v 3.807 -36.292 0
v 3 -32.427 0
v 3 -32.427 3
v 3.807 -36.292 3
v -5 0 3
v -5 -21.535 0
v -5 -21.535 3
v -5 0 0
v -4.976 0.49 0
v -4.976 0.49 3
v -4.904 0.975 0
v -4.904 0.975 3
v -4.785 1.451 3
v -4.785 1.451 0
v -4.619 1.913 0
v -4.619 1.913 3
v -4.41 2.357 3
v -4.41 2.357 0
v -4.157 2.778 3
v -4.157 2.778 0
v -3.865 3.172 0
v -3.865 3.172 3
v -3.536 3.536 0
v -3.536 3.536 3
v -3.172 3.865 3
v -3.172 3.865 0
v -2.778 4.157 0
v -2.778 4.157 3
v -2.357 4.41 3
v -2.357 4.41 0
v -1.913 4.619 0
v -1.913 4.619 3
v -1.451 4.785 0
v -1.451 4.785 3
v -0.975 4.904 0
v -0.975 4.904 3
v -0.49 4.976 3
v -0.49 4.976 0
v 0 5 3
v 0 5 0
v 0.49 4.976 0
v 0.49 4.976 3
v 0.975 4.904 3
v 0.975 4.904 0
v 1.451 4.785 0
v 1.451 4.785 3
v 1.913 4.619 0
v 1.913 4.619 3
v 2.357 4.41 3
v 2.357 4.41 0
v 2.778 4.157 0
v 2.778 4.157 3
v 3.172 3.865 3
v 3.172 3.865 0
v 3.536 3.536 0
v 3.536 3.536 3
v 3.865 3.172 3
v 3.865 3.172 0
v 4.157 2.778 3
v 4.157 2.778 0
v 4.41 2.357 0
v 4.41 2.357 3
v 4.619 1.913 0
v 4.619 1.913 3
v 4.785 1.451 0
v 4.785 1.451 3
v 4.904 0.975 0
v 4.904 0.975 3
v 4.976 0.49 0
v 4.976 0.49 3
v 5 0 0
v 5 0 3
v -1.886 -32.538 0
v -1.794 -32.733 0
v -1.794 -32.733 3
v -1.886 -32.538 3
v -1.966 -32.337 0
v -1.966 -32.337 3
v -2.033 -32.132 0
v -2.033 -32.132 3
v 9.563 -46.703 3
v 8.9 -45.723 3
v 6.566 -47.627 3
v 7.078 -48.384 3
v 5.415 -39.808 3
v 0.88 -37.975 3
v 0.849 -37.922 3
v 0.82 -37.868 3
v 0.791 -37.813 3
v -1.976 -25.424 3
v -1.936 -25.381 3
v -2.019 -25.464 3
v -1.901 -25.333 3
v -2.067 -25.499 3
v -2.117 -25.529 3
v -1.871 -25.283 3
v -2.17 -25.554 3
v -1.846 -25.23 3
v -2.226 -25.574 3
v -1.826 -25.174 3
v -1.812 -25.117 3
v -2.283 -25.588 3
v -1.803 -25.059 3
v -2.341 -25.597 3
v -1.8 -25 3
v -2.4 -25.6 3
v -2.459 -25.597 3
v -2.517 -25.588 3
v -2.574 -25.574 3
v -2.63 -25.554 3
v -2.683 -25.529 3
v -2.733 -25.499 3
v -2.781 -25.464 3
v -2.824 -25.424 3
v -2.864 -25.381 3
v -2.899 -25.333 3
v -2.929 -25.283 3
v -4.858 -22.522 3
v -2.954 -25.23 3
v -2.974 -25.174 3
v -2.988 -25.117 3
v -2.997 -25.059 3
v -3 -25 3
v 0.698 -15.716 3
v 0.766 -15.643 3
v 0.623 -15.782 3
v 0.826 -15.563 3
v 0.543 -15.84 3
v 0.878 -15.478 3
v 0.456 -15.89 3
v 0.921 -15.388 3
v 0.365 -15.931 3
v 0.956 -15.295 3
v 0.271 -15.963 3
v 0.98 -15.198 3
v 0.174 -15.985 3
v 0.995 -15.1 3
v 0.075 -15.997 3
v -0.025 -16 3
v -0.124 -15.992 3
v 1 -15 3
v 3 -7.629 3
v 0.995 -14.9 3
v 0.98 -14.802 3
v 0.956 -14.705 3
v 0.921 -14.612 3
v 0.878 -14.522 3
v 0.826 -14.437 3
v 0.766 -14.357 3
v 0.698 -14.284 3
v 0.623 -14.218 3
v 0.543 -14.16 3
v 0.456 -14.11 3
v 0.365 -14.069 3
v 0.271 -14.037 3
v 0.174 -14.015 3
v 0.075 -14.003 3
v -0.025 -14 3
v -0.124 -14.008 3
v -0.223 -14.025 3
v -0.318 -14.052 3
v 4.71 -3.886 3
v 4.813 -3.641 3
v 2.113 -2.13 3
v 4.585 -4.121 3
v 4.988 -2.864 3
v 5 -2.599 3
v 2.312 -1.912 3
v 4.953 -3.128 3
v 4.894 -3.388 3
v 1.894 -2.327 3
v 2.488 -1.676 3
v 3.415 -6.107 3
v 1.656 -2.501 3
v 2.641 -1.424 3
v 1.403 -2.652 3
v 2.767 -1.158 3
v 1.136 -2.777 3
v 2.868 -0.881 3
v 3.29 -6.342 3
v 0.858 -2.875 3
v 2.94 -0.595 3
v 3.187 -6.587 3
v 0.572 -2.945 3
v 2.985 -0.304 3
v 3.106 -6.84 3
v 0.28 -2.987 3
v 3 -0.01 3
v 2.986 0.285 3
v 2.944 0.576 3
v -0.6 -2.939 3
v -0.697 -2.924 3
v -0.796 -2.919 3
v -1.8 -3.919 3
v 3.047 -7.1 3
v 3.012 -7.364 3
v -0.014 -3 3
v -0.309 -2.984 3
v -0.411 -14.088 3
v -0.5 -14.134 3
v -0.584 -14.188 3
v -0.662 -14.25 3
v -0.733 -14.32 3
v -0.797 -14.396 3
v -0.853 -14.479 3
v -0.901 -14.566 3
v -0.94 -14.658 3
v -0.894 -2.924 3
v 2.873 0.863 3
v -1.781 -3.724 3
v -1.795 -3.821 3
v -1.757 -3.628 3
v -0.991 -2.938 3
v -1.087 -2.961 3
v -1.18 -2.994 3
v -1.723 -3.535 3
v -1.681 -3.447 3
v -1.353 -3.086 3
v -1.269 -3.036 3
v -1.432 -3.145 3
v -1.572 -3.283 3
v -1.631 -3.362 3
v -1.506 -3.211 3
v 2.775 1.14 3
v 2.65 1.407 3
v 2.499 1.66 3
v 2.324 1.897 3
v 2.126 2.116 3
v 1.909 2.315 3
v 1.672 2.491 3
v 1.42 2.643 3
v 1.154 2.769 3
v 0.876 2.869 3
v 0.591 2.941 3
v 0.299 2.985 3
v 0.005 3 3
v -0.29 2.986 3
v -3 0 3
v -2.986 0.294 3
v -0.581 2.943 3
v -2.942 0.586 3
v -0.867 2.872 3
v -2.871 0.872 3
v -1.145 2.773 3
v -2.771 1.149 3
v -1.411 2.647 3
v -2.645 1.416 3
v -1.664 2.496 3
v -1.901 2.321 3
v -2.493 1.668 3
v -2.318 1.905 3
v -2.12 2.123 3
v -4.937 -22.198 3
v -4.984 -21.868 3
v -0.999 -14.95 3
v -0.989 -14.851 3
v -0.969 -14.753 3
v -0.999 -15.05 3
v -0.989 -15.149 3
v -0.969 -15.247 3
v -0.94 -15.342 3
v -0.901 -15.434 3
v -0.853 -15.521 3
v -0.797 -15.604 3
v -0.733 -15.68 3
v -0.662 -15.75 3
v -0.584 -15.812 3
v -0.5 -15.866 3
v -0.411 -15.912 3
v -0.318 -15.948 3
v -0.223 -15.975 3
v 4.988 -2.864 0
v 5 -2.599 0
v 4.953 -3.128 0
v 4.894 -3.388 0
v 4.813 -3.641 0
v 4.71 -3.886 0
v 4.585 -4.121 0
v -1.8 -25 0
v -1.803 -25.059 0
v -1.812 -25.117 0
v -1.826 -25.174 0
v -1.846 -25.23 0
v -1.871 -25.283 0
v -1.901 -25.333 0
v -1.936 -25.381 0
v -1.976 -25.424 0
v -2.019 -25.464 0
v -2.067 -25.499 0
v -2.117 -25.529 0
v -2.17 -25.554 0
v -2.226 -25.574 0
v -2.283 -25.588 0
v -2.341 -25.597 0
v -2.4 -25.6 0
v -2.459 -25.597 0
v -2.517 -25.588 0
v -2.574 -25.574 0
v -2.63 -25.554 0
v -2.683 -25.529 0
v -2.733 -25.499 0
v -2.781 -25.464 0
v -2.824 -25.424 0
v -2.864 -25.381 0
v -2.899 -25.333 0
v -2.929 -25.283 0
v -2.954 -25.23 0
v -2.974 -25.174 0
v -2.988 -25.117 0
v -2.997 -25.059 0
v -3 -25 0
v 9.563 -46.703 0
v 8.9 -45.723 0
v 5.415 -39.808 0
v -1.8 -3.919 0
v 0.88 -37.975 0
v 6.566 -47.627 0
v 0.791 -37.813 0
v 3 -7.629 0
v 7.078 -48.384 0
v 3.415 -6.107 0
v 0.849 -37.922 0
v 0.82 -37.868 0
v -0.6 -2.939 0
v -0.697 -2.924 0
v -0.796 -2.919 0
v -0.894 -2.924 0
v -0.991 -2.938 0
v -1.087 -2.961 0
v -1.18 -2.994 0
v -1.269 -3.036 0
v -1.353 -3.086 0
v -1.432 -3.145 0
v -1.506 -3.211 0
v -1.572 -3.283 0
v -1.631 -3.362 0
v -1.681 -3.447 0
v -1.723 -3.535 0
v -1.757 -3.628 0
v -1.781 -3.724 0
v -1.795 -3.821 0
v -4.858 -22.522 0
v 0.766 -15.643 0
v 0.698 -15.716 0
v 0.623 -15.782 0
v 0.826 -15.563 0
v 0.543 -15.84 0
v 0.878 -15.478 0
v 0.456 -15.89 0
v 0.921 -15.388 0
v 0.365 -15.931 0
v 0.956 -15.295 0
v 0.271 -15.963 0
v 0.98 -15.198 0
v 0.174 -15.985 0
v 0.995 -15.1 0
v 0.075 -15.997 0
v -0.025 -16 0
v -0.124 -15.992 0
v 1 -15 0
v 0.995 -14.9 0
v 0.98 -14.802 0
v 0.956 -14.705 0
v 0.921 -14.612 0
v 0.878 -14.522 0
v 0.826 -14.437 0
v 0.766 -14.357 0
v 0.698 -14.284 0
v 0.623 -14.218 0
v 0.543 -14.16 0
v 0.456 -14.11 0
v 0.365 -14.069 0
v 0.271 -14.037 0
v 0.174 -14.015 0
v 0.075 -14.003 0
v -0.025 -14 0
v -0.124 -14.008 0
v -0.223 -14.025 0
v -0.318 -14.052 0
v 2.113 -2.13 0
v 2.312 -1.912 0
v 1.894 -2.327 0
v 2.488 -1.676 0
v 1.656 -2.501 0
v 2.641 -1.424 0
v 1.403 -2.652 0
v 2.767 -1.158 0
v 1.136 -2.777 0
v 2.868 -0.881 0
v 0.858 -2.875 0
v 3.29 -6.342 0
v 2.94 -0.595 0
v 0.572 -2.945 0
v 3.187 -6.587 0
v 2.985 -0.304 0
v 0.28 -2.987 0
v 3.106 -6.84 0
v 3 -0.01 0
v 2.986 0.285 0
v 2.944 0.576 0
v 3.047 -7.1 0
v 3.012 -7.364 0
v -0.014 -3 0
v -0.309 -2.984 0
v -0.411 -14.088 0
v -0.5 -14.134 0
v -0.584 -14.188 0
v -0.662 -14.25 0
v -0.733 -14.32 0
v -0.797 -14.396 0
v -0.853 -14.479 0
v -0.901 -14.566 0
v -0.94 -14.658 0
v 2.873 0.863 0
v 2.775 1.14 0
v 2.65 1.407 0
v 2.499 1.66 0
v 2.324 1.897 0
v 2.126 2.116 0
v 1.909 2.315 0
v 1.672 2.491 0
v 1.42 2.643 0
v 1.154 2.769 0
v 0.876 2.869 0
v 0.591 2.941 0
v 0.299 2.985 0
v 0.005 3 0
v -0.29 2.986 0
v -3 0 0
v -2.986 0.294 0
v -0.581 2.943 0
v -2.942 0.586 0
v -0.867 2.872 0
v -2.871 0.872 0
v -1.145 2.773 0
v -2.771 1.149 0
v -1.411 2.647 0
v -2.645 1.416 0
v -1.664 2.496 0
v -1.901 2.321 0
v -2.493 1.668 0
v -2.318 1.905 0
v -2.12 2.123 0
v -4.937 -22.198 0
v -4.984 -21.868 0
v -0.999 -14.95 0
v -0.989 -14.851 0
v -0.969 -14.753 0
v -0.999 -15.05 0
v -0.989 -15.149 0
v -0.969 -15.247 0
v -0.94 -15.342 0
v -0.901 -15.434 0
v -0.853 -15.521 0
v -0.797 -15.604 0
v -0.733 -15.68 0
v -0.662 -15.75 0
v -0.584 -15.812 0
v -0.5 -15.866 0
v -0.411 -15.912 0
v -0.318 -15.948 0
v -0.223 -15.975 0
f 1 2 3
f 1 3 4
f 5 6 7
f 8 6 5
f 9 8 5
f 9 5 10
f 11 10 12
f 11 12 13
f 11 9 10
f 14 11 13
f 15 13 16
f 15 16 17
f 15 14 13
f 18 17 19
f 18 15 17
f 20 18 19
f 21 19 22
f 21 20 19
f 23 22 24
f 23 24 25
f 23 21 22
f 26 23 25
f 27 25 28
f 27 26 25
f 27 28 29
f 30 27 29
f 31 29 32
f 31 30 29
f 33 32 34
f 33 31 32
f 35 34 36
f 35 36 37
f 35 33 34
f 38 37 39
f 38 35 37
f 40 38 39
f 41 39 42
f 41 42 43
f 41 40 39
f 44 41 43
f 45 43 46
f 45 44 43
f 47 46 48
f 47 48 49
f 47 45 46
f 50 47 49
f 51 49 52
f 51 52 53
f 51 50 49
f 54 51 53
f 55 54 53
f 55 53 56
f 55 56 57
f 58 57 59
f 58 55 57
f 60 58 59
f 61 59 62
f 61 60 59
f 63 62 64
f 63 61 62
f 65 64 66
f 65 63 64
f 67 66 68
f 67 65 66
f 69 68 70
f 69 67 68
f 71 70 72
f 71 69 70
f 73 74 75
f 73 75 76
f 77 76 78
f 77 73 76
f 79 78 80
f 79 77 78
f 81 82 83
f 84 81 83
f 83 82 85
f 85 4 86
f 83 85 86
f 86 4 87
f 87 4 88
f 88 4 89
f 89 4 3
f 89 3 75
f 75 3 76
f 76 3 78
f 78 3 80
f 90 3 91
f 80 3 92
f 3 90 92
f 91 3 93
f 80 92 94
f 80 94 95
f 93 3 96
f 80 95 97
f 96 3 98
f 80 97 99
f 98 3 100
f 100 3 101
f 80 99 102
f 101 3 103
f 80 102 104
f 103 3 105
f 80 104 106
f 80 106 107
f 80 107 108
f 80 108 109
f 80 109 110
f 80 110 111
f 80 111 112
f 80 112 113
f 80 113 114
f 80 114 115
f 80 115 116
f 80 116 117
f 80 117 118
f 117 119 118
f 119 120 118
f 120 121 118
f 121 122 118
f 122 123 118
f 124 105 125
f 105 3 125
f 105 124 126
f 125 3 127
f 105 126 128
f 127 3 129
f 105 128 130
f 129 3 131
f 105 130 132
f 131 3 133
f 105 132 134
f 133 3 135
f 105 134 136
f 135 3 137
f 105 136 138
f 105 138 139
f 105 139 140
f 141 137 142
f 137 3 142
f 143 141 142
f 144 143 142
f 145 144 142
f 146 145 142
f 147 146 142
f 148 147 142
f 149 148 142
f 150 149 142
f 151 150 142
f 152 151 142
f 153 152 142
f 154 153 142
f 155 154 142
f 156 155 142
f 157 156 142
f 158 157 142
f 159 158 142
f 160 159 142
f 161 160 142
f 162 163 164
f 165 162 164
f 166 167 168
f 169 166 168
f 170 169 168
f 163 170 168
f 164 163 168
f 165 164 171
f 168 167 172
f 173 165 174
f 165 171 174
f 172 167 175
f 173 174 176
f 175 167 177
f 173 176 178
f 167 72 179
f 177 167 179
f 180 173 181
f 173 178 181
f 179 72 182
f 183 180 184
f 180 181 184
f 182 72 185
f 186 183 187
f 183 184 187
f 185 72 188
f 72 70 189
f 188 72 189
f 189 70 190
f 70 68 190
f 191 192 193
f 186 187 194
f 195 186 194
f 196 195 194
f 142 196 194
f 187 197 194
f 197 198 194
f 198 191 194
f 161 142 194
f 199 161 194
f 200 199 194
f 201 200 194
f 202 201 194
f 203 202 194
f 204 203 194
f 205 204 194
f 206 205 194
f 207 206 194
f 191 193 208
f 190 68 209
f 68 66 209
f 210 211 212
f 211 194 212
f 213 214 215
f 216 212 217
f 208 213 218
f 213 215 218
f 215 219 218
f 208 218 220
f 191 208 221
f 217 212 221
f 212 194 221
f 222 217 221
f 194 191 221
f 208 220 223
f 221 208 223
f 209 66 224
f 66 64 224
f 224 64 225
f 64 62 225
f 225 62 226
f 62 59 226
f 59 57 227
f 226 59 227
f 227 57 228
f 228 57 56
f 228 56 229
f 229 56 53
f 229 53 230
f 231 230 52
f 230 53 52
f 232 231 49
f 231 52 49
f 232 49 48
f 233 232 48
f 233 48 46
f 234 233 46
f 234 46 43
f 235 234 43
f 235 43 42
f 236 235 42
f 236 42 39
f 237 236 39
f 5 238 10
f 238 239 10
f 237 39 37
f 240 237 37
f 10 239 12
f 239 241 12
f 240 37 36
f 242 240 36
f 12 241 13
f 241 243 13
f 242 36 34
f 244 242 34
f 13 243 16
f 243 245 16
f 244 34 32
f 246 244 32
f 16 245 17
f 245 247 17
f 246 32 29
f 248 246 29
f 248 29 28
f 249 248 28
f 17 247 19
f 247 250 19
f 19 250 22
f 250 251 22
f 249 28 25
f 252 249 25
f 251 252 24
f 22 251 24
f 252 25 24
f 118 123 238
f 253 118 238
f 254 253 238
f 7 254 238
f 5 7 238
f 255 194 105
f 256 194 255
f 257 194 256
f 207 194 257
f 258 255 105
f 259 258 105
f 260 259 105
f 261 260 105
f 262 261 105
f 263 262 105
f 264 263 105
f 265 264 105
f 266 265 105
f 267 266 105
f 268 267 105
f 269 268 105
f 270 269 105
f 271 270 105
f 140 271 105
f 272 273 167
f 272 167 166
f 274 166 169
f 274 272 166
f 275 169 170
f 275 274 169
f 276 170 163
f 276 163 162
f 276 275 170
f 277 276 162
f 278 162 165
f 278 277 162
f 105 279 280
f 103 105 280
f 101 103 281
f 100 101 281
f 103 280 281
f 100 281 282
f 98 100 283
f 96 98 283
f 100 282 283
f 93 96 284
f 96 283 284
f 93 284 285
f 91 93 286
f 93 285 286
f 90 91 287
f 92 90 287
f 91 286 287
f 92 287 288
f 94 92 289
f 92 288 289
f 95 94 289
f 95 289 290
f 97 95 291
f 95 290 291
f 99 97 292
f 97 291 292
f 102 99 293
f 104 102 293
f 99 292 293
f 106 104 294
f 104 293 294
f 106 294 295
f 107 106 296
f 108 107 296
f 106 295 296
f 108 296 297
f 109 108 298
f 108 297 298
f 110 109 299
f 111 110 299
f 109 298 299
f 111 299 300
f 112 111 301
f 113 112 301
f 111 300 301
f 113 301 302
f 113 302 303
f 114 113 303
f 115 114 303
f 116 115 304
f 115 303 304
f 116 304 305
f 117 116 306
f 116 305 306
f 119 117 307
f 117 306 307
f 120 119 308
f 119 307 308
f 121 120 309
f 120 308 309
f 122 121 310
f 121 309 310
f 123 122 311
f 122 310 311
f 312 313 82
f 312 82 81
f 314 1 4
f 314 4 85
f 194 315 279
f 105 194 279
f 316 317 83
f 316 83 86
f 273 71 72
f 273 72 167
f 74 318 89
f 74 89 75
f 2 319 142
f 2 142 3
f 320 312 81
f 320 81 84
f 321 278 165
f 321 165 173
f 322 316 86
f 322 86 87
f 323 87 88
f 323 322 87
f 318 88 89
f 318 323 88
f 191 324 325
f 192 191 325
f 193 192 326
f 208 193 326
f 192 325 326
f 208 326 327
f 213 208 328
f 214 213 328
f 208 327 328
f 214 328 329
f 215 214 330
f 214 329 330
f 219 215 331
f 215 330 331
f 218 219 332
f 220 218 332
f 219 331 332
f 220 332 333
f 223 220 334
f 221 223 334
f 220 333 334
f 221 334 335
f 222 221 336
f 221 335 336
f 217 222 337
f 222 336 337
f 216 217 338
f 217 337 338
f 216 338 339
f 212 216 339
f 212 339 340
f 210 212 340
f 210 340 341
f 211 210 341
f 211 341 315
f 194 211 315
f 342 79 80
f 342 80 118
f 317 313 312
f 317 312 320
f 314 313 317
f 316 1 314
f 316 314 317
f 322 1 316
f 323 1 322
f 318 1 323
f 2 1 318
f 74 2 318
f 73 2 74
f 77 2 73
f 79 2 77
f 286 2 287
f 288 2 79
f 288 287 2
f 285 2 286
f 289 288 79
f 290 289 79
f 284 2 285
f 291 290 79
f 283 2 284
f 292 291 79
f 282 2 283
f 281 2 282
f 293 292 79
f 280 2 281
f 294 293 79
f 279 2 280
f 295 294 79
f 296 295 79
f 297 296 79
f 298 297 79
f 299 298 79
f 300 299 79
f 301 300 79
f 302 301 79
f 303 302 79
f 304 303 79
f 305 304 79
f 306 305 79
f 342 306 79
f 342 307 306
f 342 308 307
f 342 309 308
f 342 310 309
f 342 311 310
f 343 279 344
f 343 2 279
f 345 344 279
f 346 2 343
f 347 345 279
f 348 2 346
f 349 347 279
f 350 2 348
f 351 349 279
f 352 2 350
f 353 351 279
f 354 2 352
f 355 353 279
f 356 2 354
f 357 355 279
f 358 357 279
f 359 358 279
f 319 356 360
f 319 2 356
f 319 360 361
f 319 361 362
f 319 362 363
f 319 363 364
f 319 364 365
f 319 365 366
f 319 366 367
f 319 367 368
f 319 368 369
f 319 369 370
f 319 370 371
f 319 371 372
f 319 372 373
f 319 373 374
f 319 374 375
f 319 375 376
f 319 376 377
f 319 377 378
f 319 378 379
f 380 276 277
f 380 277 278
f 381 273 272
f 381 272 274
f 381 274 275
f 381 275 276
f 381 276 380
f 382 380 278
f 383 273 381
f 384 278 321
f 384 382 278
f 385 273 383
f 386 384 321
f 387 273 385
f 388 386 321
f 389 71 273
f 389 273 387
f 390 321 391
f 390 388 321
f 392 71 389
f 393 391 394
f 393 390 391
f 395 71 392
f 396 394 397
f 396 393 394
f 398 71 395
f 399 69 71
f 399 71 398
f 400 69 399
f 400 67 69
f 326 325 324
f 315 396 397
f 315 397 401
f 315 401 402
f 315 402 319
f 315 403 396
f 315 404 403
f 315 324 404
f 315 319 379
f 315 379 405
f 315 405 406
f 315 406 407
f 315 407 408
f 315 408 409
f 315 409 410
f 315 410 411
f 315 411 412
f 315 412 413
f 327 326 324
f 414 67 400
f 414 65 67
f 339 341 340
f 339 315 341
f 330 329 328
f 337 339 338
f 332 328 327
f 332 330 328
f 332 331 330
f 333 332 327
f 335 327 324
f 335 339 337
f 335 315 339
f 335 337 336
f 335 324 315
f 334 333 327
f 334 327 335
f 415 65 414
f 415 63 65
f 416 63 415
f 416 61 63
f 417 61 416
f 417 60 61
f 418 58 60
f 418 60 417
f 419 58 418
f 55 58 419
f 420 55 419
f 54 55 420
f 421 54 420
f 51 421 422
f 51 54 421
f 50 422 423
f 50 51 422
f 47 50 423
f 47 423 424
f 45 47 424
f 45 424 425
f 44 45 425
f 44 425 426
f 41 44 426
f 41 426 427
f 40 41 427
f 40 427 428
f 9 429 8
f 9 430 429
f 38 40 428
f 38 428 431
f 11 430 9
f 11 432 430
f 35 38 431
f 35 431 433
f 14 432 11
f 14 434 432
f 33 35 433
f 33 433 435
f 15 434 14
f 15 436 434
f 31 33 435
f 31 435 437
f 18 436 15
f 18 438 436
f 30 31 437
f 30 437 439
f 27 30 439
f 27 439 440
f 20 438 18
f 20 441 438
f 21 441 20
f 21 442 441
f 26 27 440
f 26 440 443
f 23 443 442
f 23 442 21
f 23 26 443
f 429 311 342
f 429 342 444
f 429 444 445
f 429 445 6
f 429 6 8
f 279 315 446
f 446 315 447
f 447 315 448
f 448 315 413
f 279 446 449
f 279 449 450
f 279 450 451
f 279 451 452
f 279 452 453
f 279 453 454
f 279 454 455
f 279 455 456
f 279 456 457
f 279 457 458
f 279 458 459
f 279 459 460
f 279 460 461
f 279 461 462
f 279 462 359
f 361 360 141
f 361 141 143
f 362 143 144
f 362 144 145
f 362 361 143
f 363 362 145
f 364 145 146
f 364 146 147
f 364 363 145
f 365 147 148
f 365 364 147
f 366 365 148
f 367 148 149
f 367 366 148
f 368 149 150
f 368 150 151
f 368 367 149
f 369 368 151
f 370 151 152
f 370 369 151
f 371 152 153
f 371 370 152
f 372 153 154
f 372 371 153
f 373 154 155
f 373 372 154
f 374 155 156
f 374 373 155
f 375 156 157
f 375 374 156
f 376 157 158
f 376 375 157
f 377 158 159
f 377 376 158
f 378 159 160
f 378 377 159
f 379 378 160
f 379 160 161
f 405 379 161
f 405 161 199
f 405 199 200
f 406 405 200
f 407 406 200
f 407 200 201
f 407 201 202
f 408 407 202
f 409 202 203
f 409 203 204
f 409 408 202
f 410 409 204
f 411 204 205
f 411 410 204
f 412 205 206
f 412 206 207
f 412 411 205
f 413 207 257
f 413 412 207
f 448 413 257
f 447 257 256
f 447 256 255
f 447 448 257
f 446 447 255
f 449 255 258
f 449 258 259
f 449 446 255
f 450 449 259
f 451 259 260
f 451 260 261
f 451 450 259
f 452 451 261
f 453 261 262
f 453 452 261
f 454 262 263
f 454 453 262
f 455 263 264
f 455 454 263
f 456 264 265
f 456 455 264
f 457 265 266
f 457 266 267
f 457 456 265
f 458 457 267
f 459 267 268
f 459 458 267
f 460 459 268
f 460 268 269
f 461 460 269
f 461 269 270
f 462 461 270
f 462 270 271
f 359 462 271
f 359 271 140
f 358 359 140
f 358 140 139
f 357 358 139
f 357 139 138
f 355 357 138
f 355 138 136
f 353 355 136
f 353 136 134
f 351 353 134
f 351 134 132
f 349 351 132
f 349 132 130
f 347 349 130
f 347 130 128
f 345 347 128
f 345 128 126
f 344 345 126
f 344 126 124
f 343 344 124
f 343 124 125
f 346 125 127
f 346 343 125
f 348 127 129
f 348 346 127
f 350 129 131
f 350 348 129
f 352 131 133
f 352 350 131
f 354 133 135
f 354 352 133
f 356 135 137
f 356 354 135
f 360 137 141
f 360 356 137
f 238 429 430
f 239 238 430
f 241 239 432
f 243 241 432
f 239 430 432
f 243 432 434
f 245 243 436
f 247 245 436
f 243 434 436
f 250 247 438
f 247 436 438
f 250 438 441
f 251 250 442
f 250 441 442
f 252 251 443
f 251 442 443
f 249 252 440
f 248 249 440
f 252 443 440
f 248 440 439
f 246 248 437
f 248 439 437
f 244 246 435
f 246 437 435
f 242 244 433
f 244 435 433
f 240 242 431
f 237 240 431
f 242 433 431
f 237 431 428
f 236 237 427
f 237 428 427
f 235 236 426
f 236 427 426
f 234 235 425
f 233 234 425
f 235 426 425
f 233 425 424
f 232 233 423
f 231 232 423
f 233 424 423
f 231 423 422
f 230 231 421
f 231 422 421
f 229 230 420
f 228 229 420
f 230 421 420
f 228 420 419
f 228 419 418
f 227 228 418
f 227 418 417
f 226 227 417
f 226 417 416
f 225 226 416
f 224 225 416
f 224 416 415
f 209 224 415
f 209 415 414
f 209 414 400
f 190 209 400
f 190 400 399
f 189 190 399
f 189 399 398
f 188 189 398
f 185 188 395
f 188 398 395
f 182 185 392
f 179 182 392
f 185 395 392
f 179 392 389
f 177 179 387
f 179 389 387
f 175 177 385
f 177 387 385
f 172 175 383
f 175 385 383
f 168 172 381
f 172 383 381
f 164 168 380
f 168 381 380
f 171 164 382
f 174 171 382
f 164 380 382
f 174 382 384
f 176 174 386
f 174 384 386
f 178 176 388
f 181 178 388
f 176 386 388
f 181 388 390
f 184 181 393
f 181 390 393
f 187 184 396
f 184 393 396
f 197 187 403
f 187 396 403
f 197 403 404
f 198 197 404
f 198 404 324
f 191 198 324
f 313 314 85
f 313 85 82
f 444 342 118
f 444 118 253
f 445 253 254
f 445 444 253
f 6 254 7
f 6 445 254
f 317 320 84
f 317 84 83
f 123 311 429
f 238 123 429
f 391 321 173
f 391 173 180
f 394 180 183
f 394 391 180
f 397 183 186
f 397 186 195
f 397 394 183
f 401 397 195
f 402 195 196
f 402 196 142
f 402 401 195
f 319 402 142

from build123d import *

# Parameters (mm, degrees)
SKETCH_1_R      = 1
EXTRUDE_1_DEPTH = 3


with BuildPart() as part:
    # 草图1 → 凸台-拉伸1 (new body)
    with BuildSketch(Plane.XY):
        with BuildLine():
            Line((5, 0), (5, -2.598546895))
            ThreePointArc((5, -2.598546895), (4.894337932, -3.387728708), (4.584794711, -4.121319466))
            Line((4.584794711, -4.121319466), (3.415205289, -6.106611695))
            ThreePointArc((3.415205289, -6.106611695), (3.105662068, -6.840202453), (3, -7.629384266))
            Line((3, -7.629384266), (3, -32.42729606))
            Line((3, -32.42729606), (3.807110108, -36.292324141))
            Line((3.807110108, -36.292324141), (5.41514713, -39.807586397))
            Line((5.41514713, -39.807586397), (8.899761864, -45.72298083))
            Line((8.899761864, -45.72298083), (9.562607856, -46.702581702))
            Line((9.562607856, -46.702581702), (7.077963413, -48.383813985))
            Line((7.077963413, -48.383813985), (6.565734565, -47.626805824))
            Line((6.565734565, -47.626805824), (0.880089764, -37.974998041))
            ThreePointArc((0.880089764, -37.974998041), (0.834425065, -37.894675513), (0.79125555, -37.812984837))
            Line((0.79125555, -37.812984837), (-1.794096527, -32.732789057))
            ThreePointArc((-1.794096527, -32.732789057), (-1.927277743, -32.438160812), (-2.032701862, -32.132499572))
            Line((-2.032701862, -32.132499572), (-4.857906932, -22.522211807))
            ThreePointArc((-4.857906932, -22.522211807), (-4.964294608, -22.033724953), (-5, -21.535063876))
            Line((-5, -21.535063876), (-5, 0))
            ThreePointArc((-5, 0), (0, 5), (5, 0))
        make_face()
        with Locations((0, -15)):
            Circle(SKETCH_1_R, mode=Mode.SUBTRACT)
        with BuildLine():
            Line((-3, -25), (-3, 0))
            ThreePointArc((-3, 0), (2.323790008, 1.897366596), (-0.6, -2.939387691))
            ThreePointArc((-0.6, -2.939387691), (-1.432455532, -3.144586919), (-1.8, -3.919183588))
            Line((-1.8, -3.919183588), (-1.8, -25))
            ThreePointArc((-1.8, -25), (-2.4, -25.6), (-3, -25))
        make_face(mode=Mode.SUBTRACT)
    extrude(amount=EXTRUDE_1_DEPTH)


solid = part.part
